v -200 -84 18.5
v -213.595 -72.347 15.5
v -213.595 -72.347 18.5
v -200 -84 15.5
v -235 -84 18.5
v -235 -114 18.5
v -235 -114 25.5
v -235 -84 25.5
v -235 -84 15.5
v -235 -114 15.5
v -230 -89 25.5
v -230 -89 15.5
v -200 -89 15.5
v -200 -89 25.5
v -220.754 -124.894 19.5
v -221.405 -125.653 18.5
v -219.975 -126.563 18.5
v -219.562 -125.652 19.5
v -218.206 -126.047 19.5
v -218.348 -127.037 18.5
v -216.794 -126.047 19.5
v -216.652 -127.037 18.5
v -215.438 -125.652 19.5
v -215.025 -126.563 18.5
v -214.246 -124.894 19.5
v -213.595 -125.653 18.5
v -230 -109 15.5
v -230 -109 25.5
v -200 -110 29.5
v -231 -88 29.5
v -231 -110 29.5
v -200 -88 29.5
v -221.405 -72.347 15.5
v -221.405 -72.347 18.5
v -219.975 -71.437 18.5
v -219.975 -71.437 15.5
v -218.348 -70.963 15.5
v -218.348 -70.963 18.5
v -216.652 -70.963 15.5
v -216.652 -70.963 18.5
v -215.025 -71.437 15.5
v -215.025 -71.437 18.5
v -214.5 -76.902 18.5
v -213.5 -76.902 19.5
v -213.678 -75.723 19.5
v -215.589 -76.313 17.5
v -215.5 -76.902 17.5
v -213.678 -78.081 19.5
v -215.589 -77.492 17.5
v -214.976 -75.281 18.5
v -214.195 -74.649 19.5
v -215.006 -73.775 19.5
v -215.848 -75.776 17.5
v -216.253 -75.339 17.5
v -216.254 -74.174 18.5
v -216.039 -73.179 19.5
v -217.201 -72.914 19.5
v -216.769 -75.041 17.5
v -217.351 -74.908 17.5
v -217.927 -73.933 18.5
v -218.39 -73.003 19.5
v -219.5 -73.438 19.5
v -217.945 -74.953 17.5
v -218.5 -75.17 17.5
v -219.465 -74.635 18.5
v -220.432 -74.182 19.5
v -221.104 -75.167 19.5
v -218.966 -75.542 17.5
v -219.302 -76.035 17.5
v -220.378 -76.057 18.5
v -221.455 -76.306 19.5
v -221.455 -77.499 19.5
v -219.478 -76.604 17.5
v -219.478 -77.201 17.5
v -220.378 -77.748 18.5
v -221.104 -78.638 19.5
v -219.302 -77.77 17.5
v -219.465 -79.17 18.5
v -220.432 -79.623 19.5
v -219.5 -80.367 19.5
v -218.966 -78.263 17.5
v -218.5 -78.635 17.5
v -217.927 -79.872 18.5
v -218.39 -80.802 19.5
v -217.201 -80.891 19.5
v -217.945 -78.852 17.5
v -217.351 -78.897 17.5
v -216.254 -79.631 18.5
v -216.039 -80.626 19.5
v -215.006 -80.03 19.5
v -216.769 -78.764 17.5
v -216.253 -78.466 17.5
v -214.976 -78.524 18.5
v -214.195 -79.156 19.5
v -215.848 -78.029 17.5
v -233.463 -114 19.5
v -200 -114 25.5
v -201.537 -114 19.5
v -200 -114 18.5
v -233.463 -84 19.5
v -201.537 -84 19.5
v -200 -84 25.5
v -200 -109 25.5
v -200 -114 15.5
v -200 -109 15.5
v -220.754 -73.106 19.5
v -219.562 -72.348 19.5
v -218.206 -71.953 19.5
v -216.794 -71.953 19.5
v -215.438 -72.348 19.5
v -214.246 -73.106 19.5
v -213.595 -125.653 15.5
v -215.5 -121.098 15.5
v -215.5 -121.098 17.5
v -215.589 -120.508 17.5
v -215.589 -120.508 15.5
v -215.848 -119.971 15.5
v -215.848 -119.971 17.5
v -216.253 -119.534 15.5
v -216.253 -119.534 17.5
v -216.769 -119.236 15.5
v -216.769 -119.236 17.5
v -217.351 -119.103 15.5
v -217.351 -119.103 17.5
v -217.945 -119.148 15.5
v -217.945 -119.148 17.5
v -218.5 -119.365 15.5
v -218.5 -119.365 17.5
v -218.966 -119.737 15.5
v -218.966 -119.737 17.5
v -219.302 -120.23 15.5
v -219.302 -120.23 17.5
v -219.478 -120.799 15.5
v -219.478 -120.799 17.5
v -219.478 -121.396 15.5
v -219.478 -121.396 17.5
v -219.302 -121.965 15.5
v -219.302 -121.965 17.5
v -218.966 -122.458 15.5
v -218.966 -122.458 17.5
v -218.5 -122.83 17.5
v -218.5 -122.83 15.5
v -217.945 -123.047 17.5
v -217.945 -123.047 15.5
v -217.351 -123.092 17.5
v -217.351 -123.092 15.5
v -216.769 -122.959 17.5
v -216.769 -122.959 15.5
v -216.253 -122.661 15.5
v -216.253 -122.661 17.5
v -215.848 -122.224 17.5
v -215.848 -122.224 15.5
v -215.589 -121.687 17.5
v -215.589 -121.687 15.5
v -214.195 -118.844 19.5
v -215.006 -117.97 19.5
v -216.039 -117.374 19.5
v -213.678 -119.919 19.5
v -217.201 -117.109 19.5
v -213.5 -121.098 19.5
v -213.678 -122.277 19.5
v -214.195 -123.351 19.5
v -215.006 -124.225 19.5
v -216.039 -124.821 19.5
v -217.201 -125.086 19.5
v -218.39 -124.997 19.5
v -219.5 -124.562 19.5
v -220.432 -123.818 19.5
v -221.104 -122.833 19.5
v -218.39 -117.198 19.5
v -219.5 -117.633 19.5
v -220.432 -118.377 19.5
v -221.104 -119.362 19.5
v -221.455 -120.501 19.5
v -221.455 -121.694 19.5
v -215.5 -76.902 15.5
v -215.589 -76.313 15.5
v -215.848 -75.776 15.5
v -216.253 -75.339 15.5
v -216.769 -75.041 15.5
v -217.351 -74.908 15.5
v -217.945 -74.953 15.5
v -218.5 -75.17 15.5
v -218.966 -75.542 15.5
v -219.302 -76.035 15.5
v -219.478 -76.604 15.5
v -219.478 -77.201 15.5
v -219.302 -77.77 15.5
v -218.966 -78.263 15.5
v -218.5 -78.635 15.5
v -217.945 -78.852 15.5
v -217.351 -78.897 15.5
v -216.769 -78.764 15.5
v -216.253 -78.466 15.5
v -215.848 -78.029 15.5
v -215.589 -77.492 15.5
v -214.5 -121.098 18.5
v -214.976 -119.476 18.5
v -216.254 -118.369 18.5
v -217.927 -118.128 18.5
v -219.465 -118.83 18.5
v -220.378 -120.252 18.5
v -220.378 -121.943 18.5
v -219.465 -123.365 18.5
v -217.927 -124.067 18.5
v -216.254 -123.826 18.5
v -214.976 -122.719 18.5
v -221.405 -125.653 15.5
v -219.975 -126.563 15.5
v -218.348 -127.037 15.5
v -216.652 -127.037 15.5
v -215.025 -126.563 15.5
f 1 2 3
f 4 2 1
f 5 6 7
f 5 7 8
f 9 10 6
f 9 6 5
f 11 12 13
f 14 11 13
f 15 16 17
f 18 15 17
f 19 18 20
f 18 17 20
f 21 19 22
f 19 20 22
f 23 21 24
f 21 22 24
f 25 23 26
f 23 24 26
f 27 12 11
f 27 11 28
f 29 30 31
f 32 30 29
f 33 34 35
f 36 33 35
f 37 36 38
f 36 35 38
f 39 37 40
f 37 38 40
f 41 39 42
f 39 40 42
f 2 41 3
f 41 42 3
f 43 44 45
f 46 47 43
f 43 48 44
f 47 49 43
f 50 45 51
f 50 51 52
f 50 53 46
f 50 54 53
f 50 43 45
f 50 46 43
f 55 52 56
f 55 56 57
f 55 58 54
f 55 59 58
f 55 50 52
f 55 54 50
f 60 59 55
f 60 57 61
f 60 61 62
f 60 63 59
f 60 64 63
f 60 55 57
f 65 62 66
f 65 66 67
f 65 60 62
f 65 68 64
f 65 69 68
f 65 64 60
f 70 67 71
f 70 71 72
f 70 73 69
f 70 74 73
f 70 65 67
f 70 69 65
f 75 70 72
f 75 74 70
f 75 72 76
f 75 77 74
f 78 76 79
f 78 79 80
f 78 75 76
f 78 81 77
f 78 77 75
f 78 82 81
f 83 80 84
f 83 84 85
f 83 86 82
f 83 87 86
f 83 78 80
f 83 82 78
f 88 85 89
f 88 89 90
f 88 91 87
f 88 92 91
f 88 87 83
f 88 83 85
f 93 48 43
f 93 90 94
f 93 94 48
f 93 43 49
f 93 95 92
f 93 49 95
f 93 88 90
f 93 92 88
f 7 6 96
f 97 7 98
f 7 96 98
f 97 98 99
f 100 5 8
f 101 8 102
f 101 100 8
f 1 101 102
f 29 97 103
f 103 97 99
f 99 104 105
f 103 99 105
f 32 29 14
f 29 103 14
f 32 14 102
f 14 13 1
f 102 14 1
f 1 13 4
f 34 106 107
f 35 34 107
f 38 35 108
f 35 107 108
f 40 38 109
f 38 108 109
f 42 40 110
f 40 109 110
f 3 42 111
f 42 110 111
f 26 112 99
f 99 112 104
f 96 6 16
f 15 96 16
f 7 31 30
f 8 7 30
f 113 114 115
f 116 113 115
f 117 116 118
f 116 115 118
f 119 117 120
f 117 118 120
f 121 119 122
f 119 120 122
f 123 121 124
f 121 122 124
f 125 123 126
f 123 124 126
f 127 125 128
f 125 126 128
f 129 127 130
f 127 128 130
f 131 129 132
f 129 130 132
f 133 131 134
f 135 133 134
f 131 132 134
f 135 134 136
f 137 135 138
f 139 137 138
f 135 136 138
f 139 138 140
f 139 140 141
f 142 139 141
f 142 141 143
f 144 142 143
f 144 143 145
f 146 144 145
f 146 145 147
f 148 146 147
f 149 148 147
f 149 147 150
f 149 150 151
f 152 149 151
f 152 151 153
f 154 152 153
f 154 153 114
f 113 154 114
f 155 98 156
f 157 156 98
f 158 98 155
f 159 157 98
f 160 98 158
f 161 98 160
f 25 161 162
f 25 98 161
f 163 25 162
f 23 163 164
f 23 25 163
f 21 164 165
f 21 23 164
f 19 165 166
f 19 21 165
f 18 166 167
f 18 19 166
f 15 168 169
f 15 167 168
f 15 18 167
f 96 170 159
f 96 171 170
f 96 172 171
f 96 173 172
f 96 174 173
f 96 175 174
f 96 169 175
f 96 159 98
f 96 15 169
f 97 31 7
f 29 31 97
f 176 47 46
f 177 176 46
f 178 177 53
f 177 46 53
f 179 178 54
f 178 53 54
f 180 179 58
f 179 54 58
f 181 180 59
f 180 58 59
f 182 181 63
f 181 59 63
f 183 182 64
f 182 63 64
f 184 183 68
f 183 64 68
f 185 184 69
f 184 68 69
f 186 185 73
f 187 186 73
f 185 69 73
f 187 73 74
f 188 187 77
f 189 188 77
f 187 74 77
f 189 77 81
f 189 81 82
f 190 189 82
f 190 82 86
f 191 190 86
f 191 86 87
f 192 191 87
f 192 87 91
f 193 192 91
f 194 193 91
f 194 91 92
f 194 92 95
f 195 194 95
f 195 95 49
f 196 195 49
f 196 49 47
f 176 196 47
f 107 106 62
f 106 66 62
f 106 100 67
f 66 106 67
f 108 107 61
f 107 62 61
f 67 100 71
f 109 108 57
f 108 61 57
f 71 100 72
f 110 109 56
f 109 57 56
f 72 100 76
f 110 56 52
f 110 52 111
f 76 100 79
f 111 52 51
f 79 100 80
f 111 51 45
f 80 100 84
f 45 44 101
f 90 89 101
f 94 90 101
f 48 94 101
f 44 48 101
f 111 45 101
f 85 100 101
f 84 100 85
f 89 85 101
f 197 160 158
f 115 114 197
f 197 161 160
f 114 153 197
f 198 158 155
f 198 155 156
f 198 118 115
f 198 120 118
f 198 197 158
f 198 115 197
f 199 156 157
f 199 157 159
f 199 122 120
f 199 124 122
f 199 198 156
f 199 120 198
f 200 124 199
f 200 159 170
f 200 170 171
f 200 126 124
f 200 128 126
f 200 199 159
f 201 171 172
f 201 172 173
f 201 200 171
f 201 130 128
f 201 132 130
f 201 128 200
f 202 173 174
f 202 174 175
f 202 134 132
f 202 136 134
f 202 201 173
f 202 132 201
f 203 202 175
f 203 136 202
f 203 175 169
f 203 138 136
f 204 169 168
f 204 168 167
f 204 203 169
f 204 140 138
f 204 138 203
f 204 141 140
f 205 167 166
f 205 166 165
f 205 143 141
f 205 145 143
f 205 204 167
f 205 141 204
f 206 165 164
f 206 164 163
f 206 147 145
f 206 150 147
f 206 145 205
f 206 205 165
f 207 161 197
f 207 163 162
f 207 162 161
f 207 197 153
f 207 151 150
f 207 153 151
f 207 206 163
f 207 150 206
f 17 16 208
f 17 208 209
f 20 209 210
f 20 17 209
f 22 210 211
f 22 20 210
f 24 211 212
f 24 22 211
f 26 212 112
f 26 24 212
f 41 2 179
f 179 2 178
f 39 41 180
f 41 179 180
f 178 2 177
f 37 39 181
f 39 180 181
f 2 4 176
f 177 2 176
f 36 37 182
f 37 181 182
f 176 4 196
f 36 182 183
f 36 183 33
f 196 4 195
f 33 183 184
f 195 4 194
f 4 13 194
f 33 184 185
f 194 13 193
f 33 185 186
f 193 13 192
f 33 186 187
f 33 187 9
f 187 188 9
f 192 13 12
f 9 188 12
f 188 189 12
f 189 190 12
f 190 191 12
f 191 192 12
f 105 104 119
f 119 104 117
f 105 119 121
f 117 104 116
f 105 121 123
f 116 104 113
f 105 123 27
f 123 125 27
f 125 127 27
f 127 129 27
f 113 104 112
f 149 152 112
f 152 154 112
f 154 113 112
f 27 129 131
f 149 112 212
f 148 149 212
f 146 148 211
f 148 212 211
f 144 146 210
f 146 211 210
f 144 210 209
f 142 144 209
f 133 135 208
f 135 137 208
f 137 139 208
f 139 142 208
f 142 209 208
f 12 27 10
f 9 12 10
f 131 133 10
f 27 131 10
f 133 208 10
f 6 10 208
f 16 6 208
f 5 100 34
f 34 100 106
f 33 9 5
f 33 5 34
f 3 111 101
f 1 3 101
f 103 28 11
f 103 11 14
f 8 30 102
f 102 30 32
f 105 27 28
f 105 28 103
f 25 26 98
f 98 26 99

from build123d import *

# Parameters (mm, degrees)
SKETCH064_W     = 35
SKETCH064_H     = 30
PAD030_DEPTH    = 14
SKETCH065_W     = 30
SKETCH065_H     = 20
POCKET041_DEPTH = 10
PAD031_DEPTH    = 4
FILLET012_R     = 6
SKETCH067_R     = 2
POCKET042_DEPTH = 4.001
CHAMFER026_SIZE = 4
CHAMFER027_SIZE = 2
CHAMFER028_SIZE = 1


with BuildPart() as part:
    # Sketch064 → Pad030 (new body)
    with BuildSketch(Plane.XY):
        with Locations((-217.5, -99)):
            Rectangle(SKETCH064_W, SKETCH064_H)
    extrude(amount=PAD030_DEPTH)

    # Sketch065 (on Face5 of Pad030) → Pocket041 (cut)
    with BuildSketch(Plane(origin=(0, 0, 0), x_dir=(1, 0, 0), z_dir=(0, 0, -1))):
        with Locations((-215, 99)):
            Rectangle(SKETCH065_W, SKETCH065_H)
    extrude(amount=-POCKET041_DEPTH, mode=Mode.SUBTRACT)

    # Sketch066 (on Face4 of Pocket041) → Pad031 (join)
    with BuildSketch(Plane(origin=(0, 0, 0), x_dir=(1, 0, 0), z_dir=(0, 0, -1))):
        Polygon((-235, 114), (-217.5, 129), (-200, 114), align=None)
        Polygon((-235, 84), (-217.5, 69), (-200, 84), align=None)
    extrude(amount=-PAD031_DEPTH)

    # Fillet012
    fillet012_edges = [part.edges().sort_by_distance(p)[0] for p in [
        (-217.5, -129, 2),
        (-217.5, -69, 2),
    ]]
    fillet(fillet012_edges, radius=FILLET012_R)

    # Sketch067 (on Face1 of Fillet012) → Pocket042 (cut, through all)
    with BuildSketch(Plane.XY.offset(4)):
        with Locations((-217.5, -76.902467)):
            Circle(SKETCH067_R)
        with Locations((-217.5, -121.097533)):
            Circle(SKETCH067_R)
    extrude(amount=-POCKET042_DEPTH, mode=Mode.SUBTRACT)

    # Chamfer026
    chamfer026_edges = [part.edges().sort_by_distance(p)[0] for p in [
        (-235, -99, 14),
        (-217.5, -114, 14),
        (-217.5, -84, 14),
    ]]
    chamfer(chamfer026_edges, length=CHAMFER026_SIZE)

    # Chamfer027
    chamfer027_edges = [part.edges().sort_by_distance(p)[0] for p in [
        (-219.5, -121.097533, 4),
        (-219.5, -76.902467, 4),
    ]]
    chamfer(chamfer027_edges, length=CHAMFER027_SIZE)

    # Chamfer028
    chamfer028_edges = [part.edges().sort_by_distance(p)[0] for p in [
        (-217.5, -127.097533, 4),
        (-217.5, -70.902467, 4),
    ]]
    chamfer(chamfer028_edges, length=CHAMFER028_SIZE)


with BuildPart() as part_1:
    # Body023 placement: moved
    add(part.part.moved(Location((0, 0, 15.5))))


solid = part_1.part
